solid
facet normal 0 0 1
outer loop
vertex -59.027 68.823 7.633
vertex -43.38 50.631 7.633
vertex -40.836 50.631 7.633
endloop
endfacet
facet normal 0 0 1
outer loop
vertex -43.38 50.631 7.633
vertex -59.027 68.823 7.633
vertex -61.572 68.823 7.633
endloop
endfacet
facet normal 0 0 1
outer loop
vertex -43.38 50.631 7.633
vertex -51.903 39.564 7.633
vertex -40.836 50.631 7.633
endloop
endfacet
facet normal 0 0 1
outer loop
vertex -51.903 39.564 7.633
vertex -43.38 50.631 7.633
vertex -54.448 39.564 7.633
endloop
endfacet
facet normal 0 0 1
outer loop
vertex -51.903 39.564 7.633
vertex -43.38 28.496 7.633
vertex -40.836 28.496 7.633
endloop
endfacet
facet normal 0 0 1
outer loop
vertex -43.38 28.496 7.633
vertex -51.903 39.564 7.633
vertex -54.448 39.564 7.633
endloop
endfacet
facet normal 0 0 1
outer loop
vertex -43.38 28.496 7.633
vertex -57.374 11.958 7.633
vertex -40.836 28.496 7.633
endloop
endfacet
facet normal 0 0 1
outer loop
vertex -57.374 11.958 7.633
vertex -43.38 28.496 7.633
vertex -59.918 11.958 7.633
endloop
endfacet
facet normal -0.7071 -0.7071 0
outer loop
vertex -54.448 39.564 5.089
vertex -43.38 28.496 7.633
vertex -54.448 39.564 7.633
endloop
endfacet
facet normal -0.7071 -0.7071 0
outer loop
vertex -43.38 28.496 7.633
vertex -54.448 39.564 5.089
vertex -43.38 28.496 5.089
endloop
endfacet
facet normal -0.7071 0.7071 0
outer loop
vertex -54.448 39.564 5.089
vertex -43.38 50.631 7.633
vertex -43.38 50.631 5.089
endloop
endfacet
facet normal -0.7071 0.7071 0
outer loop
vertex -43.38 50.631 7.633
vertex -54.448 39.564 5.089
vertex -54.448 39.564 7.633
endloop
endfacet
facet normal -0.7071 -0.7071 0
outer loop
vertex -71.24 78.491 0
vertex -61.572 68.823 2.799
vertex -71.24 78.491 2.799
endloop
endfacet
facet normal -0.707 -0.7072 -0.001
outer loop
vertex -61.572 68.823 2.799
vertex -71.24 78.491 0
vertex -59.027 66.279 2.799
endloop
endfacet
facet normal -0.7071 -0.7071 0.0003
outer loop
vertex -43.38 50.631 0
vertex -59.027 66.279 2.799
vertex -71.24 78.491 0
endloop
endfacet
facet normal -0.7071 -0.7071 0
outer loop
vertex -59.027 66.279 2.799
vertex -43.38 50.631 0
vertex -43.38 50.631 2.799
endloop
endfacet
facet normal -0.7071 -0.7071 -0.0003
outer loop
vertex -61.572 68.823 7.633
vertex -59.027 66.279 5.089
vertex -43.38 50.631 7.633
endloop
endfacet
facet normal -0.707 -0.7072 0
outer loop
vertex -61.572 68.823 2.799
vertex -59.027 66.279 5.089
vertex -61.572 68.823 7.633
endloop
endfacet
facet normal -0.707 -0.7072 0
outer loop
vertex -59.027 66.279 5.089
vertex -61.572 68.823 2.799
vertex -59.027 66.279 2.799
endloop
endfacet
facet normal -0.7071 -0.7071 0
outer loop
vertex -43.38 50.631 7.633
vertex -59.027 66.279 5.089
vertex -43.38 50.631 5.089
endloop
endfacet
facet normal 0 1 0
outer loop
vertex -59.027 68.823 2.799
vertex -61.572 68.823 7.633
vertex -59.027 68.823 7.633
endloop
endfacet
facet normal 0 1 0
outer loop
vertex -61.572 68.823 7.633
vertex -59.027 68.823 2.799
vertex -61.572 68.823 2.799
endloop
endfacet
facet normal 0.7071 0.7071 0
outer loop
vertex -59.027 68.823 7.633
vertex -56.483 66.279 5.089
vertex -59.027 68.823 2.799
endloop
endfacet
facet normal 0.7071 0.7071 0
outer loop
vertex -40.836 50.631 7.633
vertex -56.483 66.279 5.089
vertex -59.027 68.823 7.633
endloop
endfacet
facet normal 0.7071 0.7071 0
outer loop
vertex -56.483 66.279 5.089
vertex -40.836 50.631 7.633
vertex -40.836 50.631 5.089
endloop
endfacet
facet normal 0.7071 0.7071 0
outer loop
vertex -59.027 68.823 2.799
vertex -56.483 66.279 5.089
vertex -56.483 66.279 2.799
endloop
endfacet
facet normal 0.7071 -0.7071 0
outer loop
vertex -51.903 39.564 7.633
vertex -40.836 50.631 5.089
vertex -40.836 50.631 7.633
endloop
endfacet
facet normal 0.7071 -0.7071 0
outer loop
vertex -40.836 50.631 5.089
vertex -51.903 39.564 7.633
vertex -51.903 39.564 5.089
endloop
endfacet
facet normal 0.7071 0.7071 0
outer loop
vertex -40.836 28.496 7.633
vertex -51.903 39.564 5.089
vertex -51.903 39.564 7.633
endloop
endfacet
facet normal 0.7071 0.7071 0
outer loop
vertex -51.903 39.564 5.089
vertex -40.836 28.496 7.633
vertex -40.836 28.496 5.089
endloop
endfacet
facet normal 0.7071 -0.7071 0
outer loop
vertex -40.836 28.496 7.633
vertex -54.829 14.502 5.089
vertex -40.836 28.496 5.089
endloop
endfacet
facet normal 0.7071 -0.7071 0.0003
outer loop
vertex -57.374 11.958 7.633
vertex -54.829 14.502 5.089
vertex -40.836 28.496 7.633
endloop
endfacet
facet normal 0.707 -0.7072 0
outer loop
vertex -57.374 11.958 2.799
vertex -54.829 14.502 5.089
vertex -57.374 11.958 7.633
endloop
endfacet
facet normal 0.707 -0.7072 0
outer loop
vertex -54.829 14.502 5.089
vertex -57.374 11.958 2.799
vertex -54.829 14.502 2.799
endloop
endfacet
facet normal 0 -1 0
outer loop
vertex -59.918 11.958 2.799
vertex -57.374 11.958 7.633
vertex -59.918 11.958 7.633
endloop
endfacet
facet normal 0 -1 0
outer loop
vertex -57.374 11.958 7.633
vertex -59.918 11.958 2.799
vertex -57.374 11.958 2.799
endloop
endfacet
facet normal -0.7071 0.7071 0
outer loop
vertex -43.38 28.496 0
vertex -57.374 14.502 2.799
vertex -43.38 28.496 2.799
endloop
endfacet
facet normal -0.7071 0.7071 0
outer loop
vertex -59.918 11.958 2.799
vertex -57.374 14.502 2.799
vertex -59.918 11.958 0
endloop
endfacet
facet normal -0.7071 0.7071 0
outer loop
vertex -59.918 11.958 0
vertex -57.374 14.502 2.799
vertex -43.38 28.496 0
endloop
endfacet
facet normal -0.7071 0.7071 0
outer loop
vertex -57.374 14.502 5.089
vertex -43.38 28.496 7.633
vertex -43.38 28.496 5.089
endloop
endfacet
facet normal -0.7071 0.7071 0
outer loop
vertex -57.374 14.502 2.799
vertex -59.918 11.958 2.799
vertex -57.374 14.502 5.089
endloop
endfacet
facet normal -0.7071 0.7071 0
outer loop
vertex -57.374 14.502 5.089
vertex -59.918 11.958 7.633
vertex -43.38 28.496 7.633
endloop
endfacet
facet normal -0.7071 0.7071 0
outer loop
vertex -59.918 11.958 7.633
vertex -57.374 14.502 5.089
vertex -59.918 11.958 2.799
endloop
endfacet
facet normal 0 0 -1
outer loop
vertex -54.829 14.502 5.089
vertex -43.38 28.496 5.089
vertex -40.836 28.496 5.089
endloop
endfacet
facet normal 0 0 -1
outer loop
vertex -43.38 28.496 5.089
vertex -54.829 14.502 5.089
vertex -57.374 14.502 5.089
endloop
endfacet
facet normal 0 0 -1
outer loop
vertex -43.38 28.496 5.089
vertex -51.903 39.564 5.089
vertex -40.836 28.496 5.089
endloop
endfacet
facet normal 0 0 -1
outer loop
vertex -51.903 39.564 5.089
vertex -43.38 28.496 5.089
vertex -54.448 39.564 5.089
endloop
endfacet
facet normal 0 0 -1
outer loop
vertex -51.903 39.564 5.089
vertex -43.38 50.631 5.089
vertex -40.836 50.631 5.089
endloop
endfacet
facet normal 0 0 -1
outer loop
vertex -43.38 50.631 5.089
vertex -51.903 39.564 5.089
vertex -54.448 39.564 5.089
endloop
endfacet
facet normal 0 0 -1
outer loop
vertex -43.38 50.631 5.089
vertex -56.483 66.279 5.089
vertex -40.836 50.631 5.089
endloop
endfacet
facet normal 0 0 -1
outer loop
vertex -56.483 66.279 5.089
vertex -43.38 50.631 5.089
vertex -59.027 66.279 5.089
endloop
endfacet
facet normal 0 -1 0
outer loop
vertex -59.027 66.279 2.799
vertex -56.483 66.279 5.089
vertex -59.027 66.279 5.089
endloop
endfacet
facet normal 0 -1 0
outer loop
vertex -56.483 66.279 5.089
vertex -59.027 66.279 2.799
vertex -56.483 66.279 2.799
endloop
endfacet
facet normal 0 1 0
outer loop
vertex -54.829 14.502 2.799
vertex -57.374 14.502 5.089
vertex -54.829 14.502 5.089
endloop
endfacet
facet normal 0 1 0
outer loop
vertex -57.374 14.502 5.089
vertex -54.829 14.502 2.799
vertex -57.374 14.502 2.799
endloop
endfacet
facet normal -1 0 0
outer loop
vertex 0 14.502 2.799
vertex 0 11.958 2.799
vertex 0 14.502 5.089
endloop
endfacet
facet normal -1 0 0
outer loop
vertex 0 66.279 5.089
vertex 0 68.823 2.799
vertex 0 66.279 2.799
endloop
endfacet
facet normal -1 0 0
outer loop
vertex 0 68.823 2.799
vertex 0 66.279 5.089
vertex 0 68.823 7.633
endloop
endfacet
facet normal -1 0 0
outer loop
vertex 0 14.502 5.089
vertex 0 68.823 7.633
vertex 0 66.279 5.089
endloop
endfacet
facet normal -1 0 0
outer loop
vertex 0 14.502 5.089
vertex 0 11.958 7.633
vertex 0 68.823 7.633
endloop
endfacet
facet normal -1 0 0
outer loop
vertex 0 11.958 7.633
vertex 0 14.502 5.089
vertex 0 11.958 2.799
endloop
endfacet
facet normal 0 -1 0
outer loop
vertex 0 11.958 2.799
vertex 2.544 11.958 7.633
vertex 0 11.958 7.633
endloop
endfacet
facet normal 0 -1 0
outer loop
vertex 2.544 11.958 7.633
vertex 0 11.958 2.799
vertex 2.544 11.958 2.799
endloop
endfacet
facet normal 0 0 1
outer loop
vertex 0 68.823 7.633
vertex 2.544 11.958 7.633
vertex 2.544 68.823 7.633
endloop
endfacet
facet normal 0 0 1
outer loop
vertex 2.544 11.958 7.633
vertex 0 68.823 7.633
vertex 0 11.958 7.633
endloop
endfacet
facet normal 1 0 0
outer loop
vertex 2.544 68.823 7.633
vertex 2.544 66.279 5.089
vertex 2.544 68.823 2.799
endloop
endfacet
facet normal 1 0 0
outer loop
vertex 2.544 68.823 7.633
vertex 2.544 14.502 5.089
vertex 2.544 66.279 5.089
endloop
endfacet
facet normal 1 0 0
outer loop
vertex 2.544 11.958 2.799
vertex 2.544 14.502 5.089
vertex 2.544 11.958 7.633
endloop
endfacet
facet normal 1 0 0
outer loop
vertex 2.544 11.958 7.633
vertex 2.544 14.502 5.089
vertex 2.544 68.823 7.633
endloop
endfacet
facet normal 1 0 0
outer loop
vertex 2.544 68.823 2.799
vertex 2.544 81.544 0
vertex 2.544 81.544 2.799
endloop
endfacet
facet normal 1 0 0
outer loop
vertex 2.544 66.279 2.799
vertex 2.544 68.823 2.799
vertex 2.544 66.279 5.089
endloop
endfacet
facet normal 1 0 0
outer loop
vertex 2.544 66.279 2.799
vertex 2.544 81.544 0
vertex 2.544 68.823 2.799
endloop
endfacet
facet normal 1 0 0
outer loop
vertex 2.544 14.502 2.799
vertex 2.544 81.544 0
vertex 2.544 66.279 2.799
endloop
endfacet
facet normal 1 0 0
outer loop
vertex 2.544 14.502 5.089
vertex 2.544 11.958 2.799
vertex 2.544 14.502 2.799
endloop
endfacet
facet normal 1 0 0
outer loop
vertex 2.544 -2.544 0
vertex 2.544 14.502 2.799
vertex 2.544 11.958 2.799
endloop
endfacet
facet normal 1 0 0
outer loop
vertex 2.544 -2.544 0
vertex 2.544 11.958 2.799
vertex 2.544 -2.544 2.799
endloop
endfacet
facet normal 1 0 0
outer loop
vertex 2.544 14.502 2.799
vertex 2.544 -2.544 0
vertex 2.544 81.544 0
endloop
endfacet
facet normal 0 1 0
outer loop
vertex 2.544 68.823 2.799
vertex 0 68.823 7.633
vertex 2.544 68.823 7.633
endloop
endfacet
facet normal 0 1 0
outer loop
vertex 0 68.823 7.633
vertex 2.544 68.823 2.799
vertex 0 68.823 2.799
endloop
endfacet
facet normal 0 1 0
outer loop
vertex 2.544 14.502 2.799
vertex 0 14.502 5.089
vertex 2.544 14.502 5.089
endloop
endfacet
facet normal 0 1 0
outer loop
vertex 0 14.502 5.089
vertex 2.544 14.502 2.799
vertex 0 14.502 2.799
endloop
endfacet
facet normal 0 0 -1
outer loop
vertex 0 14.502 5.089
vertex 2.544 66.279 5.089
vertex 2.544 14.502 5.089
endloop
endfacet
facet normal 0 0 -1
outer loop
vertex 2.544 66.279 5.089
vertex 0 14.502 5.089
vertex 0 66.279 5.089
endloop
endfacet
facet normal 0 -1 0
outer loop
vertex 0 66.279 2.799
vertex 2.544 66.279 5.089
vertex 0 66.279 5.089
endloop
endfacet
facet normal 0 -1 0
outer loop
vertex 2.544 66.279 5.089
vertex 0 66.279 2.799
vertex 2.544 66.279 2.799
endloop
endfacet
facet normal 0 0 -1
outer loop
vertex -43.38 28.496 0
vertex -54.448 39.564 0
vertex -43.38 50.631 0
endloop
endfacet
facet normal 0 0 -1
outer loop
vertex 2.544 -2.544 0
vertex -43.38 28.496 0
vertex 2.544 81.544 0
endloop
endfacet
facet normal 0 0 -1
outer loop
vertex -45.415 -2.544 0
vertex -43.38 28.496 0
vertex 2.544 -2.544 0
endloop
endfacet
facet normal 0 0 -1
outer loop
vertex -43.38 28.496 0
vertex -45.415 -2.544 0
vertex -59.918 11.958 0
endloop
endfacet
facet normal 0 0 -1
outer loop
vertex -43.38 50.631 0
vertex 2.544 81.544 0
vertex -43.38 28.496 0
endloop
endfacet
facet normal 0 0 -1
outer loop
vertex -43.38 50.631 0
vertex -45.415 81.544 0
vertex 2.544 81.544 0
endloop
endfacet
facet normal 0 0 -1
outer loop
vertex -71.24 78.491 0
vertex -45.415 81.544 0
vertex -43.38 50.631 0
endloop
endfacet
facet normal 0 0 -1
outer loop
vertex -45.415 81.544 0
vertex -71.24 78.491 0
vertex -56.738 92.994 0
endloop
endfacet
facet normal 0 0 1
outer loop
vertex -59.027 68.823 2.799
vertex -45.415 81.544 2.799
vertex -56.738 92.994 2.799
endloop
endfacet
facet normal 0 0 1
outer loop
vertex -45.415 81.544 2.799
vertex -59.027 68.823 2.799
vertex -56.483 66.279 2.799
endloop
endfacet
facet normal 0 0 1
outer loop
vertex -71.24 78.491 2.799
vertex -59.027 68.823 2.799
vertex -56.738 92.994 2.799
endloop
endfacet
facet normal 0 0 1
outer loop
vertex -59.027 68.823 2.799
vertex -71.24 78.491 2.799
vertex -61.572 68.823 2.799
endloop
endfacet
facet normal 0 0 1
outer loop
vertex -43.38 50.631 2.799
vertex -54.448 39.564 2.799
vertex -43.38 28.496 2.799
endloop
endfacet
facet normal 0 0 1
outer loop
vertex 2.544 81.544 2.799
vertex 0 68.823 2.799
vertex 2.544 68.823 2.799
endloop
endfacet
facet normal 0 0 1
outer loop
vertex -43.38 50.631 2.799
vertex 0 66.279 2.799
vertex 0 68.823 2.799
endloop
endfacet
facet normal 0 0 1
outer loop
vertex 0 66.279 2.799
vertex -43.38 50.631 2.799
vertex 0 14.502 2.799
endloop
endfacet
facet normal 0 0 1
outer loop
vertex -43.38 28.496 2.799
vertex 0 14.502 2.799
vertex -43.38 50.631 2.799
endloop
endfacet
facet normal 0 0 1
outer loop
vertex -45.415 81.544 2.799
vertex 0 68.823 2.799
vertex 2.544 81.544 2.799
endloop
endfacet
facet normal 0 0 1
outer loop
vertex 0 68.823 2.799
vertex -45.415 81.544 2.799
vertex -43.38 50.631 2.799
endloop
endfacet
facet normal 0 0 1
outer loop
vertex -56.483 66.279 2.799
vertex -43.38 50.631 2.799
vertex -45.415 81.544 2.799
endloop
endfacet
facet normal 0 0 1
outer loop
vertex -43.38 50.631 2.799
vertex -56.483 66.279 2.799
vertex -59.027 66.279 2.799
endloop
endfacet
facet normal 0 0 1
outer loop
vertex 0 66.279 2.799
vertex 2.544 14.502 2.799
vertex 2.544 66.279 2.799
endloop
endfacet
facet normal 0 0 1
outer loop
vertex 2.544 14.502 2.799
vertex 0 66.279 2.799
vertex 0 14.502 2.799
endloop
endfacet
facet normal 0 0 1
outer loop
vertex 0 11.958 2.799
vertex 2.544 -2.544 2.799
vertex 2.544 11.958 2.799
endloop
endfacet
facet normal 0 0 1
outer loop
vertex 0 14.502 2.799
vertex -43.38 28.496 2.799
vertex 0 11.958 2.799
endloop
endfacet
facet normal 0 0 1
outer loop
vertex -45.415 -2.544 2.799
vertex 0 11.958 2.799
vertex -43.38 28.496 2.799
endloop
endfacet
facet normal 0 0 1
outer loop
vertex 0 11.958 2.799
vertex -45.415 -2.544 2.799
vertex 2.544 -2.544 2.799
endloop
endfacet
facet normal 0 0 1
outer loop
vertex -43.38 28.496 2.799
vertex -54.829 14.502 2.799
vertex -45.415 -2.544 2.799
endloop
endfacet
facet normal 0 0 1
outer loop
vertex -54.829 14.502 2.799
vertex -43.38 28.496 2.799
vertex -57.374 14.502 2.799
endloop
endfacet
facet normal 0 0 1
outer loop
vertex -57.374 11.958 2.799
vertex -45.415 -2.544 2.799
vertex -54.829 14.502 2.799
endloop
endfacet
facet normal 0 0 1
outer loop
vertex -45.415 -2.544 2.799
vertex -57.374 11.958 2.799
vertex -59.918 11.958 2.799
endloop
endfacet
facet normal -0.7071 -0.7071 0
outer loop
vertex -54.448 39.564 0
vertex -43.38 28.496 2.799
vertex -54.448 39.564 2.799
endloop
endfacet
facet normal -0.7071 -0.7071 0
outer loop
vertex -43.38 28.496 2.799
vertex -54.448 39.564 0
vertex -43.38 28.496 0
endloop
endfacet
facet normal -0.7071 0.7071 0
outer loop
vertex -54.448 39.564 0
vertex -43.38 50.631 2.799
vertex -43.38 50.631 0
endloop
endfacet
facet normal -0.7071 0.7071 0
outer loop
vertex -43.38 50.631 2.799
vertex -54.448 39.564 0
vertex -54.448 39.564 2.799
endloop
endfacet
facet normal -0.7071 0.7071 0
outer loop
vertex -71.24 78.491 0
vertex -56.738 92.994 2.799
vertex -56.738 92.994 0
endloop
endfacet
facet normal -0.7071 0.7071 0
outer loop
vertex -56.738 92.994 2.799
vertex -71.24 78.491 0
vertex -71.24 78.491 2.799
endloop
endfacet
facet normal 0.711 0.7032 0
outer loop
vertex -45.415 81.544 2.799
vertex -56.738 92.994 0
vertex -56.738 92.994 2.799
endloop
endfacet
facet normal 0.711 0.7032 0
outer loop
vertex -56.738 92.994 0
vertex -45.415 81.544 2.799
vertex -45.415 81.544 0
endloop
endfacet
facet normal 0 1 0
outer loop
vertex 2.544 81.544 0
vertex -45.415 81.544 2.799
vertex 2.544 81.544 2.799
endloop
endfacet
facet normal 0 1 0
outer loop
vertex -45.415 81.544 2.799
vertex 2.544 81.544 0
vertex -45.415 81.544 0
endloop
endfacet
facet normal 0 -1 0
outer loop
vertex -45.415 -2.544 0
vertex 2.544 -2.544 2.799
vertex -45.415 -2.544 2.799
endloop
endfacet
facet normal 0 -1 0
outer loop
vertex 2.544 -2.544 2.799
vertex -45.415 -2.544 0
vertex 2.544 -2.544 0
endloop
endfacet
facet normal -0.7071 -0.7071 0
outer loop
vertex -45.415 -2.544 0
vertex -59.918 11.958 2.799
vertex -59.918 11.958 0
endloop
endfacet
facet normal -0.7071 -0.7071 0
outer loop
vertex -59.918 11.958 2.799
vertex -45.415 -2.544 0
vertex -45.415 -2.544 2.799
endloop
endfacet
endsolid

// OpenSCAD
//Project of the Engduino Case by Jacek Karwowski 2014
//
//This is file containing lid model only, full description in project.scad file

w = 20;
scale(79/621) //scale to milimeters
mirror([1, 0, 0])
union()
{
linear_extrude(height = w+2, convexity = 10)
{
	polygon(points = [[0-w, 0-w], [357, 0-w], [451+w, 94], [321+w, 224], [408+w, 311], [321+w, 398], [464+w, 541], [540+w, 617], [446, 711+w], [357, 621+w], [0-w, 621+w]]); 
} //B


union()
{
	translate([-w, 0, w])
	difference()
	{
		linear_extrude(height = 2*w, convexity = 10)
		{
		
			polygon(points = [[451+w, 94], [321+w, 224], [408+w, 311], [321+w, 398], [464+w, 541], [464+2*w, 541], [321+2*w, 398], [408+2*w, 311], [321+2*w, 224], [451+2*w, 94]]); //X1
		}
		
		linear_extrude(height = w, convexity = 10)
		{
			polygon(points = [[451-w, 94+w], [321+w, 224], [408+w, 311], [321+w, 398], [464, 541-w], [464+w, 541-w], [321+2*w, 398], [408+2*w, 311], [321+2*w, 224], [451+w, 94+w]]); //X1
		
		}
		
	} //P1
	translate([w, 0, w])
	difference()
	{
	
		linear_extrude(height = 2*w, convexity = 10)
		{
			polygon(points = [[-w, 94], [-w, 541], [-2*w, 541], [-2*w, 94]]); //X2
		}

		linear_extrude(height = w, convexity = 10)
		{
			polygon(points = [[-w, 94+w], [-w, 541-w], [-2*w, 541-w], [-2*w, 94+w]]); //Y2
		}
	} //P2
}
}
